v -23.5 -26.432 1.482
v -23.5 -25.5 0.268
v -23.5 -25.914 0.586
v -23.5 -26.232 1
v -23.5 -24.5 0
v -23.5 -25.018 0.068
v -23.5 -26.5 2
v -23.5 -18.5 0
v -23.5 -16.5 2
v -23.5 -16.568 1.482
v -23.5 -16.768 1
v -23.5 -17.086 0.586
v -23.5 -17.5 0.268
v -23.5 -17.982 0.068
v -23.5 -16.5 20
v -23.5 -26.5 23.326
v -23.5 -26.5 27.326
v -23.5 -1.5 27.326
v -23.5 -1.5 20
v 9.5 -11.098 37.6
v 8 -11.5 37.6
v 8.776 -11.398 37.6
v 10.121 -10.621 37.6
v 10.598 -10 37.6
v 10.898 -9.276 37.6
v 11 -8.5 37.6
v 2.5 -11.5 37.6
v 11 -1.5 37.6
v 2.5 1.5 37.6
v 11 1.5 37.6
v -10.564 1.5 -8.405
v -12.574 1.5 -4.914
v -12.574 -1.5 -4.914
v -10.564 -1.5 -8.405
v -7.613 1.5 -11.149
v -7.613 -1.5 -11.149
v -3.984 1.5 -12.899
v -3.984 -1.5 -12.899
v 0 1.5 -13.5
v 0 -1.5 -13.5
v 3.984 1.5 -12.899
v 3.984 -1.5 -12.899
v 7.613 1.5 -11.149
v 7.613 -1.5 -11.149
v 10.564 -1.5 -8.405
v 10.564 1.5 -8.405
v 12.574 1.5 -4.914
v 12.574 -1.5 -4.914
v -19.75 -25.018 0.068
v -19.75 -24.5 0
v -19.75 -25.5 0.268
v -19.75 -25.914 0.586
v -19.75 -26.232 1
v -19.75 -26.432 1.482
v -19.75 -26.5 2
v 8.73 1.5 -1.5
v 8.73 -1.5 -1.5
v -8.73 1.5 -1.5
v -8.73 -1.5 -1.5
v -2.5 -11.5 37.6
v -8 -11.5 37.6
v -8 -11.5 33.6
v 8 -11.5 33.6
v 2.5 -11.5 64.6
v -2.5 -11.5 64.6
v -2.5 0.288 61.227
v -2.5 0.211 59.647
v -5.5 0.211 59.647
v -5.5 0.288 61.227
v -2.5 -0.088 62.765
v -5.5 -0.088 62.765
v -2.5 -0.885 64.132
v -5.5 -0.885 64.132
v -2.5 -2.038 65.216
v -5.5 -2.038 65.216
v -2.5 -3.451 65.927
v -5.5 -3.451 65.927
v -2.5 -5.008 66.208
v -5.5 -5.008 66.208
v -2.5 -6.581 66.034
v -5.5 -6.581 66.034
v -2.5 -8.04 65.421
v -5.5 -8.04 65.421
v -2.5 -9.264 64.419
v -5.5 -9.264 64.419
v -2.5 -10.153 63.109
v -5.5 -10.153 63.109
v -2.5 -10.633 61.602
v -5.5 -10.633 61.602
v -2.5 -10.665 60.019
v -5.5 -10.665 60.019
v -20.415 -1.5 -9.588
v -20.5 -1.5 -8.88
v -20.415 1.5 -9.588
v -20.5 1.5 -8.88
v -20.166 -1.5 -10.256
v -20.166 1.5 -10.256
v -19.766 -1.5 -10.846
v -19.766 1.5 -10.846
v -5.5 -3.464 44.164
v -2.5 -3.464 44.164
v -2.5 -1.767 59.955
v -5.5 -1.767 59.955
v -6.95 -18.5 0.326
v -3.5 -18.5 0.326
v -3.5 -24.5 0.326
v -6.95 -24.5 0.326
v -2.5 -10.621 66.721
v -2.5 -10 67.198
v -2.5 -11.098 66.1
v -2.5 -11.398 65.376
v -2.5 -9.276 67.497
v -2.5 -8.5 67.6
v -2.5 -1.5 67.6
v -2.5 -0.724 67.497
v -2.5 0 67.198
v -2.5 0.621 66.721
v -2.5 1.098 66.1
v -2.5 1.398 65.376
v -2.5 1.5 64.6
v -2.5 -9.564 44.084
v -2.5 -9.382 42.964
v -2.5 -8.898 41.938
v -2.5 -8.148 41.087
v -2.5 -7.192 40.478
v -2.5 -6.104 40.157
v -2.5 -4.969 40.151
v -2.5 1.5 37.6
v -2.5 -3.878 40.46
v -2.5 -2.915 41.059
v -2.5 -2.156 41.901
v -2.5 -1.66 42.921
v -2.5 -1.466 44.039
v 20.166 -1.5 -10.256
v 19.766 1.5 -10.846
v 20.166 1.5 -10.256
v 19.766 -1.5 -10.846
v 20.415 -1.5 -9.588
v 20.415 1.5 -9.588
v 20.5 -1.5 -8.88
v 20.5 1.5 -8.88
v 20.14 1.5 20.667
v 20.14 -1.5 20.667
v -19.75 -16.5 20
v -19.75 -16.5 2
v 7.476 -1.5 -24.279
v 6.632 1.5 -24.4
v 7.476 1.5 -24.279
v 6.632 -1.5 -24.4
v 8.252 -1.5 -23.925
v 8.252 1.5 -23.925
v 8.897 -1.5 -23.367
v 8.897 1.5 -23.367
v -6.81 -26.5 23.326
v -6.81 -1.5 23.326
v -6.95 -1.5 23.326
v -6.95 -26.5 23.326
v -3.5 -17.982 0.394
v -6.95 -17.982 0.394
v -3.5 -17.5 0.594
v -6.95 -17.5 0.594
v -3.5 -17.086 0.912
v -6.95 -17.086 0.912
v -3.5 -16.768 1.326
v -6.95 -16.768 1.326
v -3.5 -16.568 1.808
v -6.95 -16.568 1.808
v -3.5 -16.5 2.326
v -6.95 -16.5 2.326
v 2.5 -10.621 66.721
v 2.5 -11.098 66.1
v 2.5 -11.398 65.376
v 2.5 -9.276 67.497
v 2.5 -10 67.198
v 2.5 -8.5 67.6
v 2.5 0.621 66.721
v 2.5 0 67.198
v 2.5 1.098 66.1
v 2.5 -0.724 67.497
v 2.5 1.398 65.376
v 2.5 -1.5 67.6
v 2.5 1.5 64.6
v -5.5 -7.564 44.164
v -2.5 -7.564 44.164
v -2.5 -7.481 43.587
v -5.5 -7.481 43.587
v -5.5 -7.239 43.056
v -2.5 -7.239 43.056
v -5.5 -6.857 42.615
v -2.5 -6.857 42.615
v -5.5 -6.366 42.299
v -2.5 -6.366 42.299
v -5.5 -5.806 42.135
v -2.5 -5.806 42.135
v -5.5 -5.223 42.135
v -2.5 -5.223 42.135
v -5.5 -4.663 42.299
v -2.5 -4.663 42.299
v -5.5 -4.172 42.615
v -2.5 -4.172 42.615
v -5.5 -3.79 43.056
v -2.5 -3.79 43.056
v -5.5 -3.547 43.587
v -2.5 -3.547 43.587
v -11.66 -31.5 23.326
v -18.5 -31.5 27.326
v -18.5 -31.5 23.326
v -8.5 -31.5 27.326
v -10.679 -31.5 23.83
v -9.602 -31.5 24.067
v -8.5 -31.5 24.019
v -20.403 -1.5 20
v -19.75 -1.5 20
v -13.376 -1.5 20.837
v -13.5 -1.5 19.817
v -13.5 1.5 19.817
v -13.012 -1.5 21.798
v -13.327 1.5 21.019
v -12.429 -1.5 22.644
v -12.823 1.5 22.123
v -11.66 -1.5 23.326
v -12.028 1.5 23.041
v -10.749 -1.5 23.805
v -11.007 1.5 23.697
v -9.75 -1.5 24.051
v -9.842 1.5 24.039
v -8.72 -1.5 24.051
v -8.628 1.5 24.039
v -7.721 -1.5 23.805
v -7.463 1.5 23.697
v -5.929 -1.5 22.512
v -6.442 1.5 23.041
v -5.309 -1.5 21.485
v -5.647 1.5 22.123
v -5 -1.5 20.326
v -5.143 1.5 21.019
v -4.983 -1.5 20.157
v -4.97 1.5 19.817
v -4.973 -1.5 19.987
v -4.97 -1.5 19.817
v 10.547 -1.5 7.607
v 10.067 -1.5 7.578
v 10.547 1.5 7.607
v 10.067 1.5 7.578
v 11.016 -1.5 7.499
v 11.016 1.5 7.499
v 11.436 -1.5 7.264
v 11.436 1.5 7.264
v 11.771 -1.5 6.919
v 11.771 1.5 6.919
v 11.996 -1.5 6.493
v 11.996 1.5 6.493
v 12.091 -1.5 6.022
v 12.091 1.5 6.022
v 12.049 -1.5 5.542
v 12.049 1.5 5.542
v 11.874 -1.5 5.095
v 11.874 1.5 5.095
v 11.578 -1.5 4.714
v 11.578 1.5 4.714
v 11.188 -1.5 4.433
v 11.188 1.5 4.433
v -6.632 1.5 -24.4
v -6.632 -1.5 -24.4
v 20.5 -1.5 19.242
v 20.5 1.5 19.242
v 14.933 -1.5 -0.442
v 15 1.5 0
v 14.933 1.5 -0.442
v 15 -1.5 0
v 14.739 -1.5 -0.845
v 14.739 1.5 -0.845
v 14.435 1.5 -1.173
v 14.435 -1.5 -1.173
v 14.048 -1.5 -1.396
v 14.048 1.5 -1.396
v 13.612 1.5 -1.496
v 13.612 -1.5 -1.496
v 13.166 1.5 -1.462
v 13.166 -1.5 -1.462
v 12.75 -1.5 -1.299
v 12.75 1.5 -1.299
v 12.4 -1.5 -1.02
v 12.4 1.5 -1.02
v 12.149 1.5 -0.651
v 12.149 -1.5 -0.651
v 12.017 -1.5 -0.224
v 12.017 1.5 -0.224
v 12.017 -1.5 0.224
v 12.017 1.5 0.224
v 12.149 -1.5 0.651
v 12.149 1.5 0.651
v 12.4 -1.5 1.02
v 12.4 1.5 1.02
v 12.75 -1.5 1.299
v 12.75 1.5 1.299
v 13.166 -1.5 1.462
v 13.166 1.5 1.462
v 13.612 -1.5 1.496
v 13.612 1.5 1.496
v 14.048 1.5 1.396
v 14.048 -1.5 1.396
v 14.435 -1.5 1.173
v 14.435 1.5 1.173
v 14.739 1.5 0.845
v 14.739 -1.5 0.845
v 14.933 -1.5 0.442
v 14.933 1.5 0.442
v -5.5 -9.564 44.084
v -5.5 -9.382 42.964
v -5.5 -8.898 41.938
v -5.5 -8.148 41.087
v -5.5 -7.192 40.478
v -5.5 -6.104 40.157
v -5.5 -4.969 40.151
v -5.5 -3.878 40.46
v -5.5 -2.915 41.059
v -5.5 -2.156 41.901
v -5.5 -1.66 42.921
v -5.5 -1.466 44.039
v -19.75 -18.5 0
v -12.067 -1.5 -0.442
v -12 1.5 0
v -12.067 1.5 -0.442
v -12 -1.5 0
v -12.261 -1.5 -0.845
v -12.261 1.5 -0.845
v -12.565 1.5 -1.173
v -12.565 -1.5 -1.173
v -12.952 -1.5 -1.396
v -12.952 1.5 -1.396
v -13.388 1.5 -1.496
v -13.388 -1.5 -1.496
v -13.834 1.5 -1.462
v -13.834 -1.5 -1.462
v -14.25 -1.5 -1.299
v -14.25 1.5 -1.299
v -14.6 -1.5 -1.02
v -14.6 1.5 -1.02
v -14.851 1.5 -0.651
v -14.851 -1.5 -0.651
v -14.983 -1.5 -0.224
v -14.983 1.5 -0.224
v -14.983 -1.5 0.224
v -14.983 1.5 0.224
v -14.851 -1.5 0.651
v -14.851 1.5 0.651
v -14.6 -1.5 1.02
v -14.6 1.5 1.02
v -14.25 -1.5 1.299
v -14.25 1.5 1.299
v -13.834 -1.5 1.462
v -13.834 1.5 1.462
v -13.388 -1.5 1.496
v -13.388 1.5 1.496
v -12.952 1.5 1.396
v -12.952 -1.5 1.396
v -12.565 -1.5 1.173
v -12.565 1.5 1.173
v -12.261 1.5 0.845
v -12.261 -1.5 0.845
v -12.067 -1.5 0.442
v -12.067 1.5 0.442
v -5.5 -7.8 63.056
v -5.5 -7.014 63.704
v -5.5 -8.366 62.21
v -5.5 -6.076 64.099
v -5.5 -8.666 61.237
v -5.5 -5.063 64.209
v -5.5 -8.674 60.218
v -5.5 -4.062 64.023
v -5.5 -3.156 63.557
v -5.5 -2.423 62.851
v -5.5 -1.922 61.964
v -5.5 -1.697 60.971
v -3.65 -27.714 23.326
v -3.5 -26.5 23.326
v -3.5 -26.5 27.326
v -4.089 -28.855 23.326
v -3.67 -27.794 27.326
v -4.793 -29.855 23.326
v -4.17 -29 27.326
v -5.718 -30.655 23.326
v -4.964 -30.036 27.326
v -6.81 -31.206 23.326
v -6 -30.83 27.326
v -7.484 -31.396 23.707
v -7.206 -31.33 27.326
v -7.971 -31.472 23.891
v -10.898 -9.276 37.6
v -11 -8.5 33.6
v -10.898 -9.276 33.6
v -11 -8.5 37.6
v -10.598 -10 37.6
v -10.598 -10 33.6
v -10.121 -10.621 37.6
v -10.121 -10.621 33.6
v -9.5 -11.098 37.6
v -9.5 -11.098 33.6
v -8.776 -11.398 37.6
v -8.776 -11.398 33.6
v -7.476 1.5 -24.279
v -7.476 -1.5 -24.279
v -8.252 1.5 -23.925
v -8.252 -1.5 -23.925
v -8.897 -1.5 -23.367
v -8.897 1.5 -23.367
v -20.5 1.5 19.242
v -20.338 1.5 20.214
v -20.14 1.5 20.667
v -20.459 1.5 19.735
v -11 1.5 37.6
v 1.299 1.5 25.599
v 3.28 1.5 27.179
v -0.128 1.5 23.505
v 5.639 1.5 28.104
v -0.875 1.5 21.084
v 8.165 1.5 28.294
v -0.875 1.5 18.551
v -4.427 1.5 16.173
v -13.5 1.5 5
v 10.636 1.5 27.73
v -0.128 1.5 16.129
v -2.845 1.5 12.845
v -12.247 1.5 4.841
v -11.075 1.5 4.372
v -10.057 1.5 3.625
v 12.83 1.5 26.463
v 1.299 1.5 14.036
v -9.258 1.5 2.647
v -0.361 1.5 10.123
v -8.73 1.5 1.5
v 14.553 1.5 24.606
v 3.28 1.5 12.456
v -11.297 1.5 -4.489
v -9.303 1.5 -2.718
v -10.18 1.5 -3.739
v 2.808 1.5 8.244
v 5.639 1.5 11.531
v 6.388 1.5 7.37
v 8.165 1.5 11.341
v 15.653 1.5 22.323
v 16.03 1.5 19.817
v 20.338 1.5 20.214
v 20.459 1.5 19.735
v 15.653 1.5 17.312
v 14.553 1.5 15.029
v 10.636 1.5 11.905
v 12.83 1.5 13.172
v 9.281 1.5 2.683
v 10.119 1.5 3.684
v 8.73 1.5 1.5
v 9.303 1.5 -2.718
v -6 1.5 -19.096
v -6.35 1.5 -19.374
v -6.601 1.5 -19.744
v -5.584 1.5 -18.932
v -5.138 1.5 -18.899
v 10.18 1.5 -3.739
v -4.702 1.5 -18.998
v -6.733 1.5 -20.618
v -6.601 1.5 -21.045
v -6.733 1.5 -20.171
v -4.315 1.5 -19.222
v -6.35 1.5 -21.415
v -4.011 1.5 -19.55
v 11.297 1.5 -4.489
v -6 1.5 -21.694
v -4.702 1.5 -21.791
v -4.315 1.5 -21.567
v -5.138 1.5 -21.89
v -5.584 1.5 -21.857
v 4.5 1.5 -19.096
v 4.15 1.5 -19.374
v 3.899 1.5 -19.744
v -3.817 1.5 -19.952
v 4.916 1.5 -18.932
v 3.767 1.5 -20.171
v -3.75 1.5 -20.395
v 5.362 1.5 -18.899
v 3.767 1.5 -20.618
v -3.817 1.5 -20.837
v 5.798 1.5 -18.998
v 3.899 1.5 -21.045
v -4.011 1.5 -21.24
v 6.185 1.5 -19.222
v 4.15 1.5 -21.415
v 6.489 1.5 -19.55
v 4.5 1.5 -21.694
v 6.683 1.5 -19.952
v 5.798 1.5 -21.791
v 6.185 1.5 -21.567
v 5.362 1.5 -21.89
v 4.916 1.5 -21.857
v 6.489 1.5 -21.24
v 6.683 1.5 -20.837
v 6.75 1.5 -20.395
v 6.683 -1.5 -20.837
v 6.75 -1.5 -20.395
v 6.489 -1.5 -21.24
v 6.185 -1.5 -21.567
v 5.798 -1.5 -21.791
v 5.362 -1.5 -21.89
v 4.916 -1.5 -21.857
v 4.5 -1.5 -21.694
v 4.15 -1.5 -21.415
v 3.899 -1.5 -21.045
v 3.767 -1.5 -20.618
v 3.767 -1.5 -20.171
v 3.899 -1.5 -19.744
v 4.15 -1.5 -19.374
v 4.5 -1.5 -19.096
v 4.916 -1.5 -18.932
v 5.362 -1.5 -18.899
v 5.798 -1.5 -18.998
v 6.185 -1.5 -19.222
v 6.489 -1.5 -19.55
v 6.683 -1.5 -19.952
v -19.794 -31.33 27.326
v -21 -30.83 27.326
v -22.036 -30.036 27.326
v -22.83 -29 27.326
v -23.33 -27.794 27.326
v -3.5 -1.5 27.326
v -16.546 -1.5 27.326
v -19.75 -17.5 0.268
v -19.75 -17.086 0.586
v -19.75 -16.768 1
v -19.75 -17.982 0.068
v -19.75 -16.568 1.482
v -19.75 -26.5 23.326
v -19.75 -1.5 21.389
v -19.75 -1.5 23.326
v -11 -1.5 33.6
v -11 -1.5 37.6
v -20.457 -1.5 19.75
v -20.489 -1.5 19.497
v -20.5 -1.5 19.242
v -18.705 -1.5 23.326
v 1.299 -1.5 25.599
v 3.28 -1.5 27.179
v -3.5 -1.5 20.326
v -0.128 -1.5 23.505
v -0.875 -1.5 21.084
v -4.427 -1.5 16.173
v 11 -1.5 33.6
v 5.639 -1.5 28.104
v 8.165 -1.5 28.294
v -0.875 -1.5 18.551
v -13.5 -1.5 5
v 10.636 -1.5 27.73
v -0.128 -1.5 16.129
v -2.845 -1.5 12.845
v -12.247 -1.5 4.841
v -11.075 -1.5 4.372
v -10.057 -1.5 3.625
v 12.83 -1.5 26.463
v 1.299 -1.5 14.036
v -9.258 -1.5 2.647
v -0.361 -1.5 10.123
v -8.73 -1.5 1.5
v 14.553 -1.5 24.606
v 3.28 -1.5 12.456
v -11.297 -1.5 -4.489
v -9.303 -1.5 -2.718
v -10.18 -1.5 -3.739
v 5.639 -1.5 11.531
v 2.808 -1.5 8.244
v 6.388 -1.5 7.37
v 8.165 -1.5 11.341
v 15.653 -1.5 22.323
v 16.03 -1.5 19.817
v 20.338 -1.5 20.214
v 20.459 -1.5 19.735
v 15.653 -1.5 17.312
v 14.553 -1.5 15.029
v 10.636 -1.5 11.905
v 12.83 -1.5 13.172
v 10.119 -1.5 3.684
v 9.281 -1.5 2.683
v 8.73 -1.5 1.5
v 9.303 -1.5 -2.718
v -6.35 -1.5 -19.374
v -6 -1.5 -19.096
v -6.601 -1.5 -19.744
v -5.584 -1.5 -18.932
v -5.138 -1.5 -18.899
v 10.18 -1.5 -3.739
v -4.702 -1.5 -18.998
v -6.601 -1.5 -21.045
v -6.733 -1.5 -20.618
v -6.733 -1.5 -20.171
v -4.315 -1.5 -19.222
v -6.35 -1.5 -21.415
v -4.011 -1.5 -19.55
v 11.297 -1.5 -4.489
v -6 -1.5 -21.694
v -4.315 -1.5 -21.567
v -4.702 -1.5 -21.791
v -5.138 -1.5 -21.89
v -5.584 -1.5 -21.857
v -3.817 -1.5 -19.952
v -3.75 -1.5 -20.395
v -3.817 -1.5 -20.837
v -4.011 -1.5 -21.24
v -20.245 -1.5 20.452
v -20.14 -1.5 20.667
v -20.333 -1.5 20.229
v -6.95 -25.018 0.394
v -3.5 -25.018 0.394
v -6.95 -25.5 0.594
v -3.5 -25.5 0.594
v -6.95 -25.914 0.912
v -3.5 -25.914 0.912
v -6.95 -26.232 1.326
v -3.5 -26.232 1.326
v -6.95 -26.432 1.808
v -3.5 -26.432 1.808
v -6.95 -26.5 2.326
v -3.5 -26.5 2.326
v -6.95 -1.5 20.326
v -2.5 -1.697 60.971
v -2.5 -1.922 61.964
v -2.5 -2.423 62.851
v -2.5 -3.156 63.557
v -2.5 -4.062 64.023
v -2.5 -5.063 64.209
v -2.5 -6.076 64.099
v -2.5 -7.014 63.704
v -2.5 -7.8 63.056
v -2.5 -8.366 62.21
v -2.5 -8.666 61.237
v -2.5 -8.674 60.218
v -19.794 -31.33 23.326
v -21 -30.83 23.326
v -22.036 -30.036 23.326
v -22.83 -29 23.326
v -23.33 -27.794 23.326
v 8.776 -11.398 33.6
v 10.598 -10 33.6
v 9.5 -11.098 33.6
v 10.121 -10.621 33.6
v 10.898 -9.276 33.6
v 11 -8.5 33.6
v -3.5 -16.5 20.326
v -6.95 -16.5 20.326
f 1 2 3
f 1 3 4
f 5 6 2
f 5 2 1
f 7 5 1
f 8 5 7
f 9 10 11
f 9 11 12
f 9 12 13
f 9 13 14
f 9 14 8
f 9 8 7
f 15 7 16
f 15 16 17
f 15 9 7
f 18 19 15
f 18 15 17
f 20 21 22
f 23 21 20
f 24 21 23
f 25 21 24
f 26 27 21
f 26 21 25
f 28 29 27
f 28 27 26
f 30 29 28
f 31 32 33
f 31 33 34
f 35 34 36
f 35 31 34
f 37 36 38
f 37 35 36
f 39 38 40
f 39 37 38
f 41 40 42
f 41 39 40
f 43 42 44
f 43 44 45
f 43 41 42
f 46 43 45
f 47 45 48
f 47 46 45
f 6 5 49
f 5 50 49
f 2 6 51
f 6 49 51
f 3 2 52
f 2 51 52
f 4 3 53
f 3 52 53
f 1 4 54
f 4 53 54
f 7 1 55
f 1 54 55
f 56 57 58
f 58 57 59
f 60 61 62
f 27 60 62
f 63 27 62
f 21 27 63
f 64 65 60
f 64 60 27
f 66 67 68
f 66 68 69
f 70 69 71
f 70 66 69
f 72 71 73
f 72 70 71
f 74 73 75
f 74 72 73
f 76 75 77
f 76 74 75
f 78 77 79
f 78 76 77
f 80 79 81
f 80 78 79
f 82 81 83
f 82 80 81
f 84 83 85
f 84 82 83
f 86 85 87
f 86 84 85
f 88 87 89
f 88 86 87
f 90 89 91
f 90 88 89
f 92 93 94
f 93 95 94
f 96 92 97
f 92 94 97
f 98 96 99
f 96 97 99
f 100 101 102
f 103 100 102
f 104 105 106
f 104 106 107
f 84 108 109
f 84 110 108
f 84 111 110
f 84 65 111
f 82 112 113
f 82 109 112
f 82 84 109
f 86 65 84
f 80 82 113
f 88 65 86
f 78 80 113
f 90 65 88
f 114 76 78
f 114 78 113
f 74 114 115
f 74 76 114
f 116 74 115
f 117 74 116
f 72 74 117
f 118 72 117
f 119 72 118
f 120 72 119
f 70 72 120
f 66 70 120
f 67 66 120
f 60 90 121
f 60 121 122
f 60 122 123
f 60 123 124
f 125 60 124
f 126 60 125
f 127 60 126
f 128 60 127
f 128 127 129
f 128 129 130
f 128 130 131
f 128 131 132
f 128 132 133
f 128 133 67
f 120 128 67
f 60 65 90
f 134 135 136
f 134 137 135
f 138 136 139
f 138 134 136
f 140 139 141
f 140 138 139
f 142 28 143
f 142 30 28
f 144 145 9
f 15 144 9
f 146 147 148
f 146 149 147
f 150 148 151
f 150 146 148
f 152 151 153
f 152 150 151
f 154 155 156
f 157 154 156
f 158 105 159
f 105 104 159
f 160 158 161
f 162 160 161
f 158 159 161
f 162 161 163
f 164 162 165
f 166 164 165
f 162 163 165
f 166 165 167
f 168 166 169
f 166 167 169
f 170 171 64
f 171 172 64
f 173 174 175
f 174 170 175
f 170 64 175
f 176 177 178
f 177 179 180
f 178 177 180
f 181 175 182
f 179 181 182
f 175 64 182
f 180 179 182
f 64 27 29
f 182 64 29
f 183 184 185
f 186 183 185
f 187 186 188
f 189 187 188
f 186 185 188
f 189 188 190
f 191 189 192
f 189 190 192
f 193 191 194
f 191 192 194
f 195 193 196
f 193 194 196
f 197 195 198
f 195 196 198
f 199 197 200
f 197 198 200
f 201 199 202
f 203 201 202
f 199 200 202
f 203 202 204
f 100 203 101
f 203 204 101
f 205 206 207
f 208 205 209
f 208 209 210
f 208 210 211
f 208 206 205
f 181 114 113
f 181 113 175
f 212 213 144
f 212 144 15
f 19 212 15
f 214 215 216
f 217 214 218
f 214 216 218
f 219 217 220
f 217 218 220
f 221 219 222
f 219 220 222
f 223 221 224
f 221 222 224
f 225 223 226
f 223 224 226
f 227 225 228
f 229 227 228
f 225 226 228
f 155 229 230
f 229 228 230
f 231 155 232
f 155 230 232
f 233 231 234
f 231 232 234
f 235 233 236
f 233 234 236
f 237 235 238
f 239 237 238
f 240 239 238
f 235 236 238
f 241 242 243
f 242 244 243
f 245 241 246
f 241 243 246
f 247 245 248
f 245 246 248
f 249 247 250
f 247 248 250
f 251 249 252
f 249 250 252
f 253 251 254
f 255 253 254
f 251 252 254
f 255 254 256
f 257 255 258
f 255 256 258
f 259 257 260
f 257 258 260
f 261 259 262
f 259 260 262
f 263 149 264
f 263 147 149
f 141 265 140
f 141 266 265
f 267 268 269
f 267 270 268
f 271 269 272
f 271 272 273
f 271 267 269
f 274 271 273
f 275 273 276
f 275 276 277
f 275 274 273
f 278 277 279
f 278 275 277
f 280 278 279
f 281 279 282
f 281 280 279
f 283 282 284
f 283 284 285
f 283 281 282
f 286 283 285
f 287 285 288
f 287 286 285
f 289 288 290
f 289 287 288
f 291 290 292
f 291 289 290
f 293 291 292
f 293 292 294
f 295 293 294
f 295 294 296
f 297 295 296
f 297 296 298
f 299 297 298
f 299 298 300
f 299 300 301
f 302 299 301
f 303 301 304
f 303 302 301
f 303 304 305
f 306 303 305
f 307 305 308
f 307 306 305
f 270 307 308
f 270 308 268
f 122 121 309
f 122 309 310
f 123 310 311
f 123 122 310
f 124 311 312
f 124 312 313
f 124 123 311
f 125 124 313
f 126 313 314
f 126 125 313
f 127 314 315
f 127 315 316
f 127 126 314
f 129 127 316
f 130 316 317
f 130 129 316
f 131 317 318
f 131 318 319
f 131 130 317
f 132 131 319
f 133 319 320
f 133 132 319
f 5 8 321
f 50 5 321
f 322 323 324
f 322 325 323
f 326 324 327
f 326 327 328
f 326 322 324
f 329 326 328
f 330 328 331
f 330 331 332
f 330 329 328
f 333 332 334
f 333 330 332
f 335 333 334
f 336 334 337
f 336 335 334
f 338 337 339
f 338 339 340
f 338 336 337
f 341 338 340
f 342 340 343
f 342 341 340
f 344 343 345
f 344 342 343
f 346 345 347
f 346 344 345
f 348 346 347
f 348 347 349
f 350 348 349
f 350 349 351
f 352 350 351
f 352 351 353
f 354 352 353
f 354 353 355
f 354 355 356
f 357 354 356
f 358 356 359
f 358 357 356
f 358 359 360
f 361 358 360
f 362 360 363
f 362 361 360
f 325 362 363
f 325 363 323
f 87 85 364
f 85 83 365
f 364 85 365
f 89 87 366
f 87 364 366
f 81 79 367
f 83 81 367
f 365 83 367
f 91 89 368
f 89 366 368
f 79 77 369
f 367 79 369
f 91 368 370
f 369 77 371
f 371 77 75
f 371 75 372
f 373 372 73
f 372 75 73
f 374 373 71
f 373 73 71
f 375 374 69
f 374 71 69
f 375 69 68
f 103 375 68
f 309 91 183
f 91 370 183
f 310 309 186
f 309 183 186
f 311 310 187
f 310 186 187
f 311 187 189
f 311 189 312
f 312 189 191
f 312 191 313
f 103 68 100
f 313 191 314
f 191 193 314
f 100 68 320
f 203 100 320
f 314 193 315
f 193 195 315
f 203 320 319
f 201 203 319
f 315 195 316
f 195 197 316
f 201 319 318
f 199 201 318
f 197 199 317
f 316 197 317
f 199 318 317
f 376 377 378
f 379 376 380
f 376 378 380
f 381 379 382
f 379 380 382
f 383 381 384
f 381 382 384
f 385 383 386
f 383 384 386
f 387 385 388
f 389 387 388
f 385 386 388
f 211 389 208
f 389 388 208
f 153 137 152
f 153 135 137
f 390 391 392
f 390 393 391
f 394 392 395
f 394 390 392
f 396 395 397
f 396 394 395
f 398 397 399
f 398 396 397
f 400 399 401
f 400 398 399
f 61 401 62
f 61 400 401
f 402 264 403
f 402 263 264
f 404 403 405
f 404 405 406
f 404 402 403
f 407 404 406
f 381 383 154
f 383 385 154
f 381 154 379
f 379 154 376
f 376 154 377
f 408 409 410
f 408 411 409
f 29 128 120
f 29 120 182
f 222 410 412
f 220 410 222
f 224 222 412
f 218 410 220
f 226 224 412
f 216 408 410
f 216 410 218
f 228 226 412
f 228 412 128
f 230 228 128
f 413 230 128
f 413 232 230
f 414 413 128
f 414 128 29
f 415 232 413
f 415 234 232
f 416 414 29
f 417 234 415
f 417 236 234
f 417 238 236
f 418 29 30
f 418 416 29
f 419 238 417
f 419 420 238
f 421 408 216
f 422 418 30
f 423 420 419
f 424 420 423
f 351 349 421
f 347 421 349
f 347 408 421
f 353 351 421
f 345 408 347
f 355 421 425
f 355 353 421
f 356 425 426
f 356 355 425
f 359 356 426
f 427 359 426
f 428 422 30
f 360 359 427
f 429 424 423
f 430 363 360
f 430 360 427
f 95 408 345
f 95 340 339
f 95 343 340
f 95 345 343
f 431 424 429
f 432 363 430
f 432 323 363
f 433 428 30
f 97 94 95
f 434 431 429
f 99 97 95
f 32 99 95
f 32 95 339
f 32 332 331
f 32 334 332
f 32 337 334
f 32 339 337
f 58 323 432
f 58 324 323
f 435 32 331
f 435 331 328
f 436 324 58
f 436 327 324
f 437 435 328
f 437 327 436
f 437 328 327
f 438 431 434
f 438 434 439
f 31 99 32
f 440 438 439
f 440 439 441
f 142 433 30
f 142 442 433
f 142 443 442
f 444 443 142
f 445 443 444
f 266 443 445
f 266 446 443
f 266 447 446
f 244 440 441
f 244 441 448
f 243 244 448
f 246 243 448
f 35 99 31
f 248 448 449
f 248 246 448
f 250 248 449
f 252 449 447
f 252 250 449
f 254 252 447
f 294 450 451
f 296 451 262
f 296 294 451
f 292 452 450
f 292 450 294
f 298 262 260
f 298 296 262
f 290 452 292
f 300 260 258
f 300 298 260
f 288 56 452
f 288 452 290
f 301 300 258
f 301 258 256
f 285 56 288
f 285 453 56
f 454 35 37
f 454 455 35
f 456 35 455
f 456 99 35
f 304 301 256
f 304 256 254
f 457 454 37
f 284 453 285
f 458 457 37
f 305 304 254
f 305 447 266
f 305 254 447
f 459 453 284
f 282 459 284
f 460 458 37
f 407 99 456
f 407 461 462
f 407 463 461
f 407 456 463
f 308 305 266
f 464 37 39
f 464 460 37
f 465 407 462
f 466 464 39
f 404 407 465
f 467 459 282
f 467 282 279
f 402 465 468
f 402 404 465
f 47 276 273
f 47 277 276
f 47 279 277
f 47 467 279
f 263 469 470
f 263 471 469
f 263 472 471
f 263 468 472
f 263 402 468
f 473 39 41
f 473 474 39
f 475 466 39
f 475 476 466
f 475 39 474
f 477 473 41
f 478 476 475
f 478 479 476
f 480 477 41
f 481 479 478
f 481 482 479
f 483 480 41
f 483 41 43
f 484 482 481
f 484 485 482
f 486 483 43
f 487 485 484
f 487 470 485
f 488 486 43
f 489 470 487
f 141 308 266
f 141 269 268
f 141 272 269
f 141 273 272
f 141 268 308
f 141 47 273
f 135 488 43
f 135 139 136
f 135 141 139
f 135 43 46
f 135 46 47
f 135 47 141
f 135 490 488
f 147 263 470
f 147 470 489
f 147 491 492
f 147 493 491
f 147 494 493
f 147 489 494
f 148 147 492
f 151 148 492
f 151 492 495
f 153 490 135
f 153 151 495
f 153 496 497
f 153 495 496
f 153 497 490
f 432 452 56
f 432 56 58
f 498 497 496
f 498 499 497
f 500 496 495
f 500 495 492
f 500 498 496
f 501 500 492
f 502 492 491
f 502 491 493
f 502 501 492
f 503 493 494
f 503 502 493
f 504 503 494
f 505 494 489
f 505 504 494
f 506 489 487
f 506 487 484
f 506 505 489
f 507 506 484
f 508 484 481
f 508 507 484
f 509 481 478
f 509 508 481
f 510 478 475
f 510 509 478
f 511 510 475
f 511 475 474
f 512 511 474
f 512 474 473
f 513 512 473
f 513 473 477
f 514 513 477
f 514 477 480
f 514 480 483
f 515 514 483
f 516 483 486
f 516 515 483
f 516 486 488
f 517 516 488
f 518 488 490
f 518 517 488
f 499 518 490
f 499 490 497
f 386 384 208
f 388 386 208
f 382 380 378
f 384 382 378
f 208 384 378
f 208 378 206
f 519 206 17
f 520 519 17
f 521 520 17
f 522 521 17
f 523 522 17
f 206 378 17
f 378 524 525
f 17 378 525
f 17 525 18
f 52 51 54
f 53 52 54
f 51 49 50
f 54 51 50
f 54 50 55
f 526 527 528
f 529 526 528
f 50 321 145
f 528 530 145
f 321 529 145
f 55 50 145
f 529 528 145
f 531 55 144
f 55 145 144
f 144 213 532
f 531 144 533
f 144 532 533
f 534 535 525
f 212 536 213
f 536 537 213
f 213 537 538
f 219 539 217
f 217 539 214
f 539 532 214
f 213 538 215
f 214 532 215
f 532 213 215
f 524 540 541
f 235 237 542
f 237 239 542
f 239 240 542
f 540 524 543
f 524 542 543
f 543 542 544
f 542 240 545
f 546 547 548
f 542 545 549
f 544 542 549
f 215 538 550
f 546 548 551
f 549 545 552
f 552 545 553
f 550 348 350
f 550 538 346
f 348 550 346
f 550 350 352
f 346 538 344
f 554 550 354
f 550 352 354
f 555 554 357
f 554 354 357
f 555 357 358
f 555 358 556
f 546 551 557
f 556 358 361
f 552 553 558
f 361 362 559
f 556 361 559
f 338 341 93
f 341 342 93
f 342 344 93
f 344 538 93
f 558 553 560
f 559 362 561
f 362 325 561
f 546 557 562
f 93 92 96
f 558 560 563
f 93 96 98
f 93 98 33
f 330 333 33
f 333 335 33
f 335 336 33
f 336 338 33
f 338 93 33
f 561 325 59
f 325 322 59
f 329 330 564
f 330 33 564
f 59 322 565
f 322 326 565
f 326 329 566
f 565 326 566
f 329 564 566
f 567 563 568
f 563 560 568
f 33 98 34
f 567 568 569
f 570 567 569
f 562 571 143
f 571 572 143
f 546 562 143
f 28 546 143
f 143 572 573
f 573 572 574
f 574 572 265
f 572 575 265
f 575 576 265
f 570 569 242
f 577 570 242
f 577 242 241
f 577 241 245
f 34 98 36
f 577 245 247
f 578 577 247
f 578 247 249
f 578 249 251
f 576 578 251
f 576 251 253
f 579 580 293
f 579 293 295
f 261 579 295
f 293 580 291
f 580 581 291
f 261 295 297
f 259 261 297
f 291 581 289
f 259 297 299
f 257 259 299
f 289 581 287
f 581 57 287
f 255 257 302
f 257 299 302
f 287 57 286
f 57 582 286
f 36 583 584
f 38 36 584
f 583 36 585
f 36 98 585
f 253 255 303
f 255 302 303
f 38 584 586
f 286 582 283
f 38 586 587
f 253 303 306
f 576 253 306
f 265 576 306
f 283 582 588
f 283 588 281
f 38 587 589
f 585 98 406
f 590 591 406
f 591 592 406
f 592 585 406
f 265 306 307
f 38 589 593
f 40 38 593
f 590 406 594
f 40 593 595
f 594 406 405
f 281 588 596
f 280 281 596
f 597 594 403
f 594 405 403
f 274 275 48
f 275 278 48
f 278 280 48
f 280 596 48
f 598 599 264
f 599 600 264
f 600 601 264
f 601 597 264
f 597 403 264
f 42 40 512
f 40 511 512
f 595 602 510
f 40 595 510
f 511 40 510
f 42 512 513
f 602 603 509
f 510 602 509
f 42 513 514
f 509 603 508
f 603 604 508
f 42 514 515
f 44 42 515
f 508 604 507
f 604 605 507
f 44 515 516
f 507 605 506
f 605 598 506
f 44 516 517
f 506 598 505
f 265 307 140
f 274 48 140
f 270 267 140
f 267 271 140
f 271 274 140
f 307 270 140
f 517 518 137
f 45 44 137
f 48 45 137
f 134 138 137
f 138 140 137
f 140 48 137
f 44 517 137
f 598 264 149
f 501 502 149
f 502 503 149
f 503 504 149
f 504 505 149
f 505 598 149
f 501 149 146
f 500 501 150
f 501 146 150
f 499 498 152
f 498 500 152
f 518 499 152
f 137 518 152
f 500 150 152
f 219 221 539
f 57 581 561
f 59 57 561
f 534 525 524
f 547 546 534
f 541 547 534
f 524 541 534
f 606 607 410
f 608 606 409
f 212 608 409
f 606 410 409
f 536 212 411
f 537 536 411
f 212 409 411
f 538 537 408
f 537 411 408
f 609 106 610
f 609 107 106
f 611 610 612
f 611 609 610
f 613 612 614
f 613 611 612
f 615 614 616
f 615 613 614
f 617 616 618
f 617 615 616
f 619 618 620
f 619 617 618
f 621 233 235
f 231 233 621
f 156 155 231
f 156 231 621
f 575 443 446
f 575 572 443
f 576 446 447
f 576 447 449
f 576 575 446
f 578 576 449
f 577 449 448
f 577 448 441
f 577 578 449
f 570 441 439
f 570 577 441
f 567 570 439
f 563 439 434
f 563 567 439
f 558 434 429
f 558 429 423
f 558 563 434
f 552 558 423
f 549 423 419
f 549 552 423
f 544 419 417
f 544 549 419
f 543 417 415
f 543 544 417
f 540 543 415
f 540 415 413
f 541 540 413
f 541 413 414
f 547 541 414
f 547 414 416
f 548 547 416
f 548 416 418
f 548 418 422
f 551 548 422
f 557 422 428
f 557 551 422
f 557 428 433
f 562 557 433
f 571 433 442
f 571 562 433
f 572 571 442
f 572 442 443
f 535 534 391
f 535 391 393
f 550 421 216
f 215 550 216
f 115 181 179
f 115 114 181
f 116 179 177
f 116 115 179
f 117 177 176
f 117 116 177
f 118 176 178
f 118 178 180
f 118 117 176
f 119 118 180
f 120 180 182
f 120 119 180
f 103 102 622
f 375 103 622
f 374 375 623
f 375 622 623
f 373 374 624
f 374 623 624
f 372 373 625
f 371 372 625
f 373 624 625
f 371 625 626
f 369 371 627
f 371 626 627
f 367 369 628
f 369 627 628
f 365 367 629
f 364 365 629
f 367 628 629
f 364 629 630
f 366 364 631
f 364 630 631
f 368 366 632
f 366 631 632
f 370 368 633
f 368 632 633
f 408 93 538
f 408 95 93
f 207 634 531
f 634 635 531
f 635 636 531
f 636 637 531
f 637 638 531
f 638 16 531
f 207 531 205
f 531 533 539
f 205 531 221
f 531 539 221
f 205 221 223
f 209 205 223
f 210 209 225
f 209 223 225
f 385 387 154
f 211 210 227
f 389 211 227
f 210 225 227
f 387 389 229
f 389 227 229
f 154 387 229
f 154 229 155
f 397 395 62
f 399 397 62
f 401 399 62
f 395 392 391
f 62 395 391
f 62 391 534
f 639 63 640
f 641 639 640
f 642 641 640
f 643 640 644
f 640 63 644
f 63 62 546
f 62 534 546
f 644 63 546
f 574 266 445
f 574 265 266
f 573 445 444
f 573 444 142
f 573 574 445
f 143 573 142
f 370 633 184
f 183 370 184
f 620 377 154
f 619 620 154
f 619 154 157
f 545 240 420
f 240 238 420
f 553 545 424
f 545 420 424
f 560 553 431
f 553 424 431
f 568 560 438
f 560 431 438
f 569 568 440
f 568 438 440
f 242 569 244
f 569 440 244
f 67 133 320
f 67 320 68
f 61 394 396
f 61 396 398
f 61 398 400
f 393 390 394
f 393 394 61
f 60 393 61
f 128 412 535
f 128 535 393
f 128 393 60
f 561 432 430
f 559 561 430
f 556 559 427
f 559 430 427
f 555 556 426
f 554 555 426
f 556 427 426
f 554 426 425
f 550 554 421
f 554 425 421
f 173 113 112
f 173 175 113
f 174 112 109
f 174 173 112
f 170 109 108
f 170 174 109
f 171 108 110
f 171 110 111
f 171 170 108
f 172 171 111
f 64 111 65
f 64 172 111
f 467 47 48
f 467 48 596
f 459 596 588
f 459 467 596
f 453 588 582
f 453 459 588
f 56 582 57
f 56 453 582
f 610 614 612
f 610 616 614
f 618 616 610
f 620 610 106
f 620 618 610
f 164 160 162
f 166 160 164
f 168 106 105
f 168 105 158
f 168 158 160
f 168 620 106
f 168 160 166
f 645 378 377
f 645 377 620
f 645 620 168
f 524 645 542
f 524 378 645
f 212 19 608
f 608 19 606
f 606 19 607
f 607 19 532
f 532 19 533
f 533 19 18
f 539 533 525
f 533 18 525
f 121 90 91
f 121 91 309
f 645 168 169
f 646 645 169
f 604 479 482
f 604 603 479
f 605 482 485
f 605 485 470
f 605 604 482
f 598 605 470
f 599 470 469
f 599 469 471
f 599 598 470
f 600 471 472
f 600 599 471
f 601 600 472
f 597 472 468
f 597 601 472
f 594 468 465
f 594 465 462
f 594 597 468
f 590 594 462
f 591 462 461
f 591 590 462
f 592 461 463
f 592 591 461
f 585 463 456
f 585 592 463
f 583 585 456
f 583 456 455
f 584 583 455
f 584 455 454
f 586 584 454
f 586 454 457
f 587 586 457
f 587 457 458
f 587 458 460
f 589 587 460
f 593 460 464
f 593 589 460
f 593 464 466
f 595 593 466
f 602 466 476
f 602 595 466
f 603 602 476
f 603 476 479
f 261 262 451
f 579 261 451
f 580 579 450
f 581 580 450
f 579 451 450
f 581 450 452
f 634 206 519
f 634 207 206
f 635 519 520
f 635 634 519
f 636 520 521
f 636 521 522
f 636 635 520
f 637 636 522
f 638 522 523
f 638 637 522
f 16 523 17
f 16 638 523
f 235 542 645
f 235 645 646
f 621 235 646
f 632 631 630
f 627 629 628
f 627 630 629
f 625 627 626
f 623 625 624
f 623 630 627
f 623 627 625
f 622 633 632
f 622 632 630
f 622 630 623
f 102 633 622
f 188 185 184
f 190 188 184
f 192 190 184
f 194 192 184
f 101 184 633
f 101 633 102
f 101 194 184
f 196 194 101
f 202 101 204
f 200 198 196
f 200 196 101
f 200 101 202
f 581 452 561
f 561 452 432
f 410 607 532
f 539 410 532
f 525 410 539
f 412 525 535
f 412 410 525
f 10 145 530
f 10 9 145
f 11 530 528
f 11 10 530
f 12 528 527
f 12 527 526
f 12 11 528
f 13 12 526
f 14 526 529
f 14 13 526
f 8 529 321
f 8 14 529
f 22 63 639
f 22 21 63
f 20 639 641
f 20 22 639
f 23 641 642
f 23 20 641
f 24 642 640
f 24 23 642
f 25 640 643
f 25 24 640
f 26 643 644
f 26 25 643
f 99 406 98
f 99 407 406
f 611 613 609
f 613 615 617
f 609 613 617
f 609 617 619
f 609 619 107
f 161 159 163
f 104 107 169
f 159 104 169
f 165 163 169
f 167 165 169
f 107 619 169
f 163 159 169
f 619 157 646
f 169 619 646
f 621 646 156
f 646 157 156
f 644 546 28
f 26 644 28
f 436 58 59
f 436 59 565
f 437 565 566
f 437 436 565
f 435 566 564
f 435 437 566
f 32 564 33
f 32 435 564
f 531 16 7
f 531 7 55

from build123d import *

# Parameters (mm, degrees)
SKETCH1_R            = 1.5
SKETCH1_R_2          = 8.5
BOSS_EXTRUDE1_DEPTH  = 1.5
FILLET1_R            = 3
BOSS_EXTRUDE2_DEPTH  = 30
SKETCH7_W            = 3.75
SKETCH7_H            = 23.325864092
BOSS_EXTRUDE4_DEPTH  = 25
SKETCH10_W           = 3.45
SKETCH10_H           = 25
BOSS_EXTRUDE15_DEPTH = 23
SKETCH11_W           = 3.75
SKETCH11_H           = 15
CUT_EXTRUDE1_DEPTH   = 20
SKETCH12_W           = 3.45
SKETCH12_H           = 15
CUT_EXTRUDE2_DEPTH   = 20
SKETCH13_W           = 22
SKETCH13_H           = 4
BOSS_EXTRUDE16_DEPTH = 10
SKETCH14_W           = 2.5
SKETCH14_H           = 13
BOSS_EXTRUDE17_DEPTH = 30
FILLET3_R            = 3
FILLET4_R            = 3
FILLET5_R            = 3
FILLET6_R            = 3
FILLET7_R            = 2
FILLET8_R            = 2
FILLET9_R            = 2
FILLET10_R           = 2
FILLET11_R           = 5
FILLET12_R           = 5
BOSS_EXTRUDE18_DEPTH = 3


with BuildPart() as part:
    # Sketch1 → Boss-Extrude1 (new body, symmetric)
    with BuildSketch(Plane(origin=(0, 0, 0), x_dir=(1, 0, 0), z_dir=(0, 1, 0))):
        Polygon((8, 24.400284093), (-8, 24.400284093), (-20.5, 10), (-20.5, -20), (-11, -37.599715907), (11, -37.599715907), (20.5, -20), (20.5, 10), align=None)
        with Locations((-5.25, 20.39454584)):
            Circle(SKETCH1_R, mode=Mode.SUBTRACT)
        with Locations((5.25, 20.39454584)):
            Circle(SKETCH1_R, mode=Mode.SUBTRACT)
        with Locations((-13.5, 0)):
            Circle(SKETCH1_R, mode=Mode.SUBTRACT)
        with Locations((13.5, 0)):
            Circle(SKETCH1_R, mode=Mode.SUBTRACT)
        with Locations((7.530163354, -19.817414772)):
            Circle(SKETCH1_R_2, mode=Mode.SUBTRACT)
        with BuildLine():
            Line((-13.5, -5), (-13.5, -19.817414772))
            ThreePointArc((-13.5, -19.817414772), (-9.234918323, -24.082496449), (-4.969836646, -19.817414772))
            ThreePointArc((-4.969836646, -19.817414772), (-0.361028795, -10.12313365), (10.06681719, -7.57750516))
            ThreePointArc((10.06681719, -7.57750516), (11.99598649, -6.493442694), (11.187975781, -4.433344563))
            ThreePointArc((11.187975781, -4.433344563), (9.667400631, -3.211102938), (8.730303993, -1.5))
            Line((8.730303993, -1.5), (-8.730303993, -1.5))
            ThreePointArc((-8.730303993, -1.5), (-10.541960108, -4.031128874), (-13.5, -5))
        make_face(mode=Mode.SUBTRACT)
        with BuildLine():
            Line((8.730303993, 1.5), (-8.730303993, 1.5))
            ThreePointArc((-8.730303993, 1.5), (-10.179901517, 3.738575405), (-12.574074074, 4.913518208))
            ThreePointArc((-12.574074074, 4.913518208), (0, 13.5), (12.574074074, 4.913518208))
            ThreePointArc((12.574074074, 4.913518208), (10.179901517, 3.738575405), (8.730303993, 1.5))
        make_face(mode=Mode.SUBTRACT)
    extrude(amount=BOSS_EXTRUDE1_DEPTH, both=True)

    # Fillet1
    fillet1_edges = [part.edges().sort_by_distance(p)[0] for p in [
        (-20.5, 0, 20),
        (-20.5, 0, -10),
        (-8, 0, -24.400284093),
        (8, 0, -24.400284093),
        (20.5, 0, -10),
        (20.5, 0, 20),
    ]]
    fillet(fillet1_edges, radius=FILLET1_R)

    # Sketch4 → Boss-Extrude2 (add)
    with BuildSketch(Plane.XZ.offset(1.5)):
        Polygon((-23.5, 27.325864092), (-23.5, 23.325864092), (-18.70476029, 23.325864092), (-16.545634529, 27.325864092), align=None)
        with BuildLine():
            Line((-18.70476029, 23.325864092), (-13.5, 23.325864092))
            Line((-13.5, 23.325864092), (-11.660141009, 23.325864092))
            ThreePointArc((-11.660141009, 23.325864092), (-9.234918323, 24.082496449), (-6.809695637, 23.325864092))
            Line((-6.809695637, 23.325864092), (-3.5, 23.325864092))
            Line((-3.5, 23.325864092), (-3.5, 27.325864092))
            Line((-3.5, 27.325864092), (-16.545634529, 27.325864092))
            Line((-16.545634529, 27.325864092), (-18.70476029, 23.325864092))
        make_face()
    extrude(amount=BOSS_EXTRUDE2_DEPTH)

    # Sketch7 → Boss-Extrude4 (add)
    with BuildSketch(Plane.XZ.offset(1.5)):
        with Locations((-21.625, 11.662932046)):
            Rectangle(SKETCH7_W, SKETCH7_H)
    extrude(amount=BOSS_EXTRUDE4_DEPTH)

    # Sketch10 → Boss-Extrude15 (add)
    with BuildSketch(Plane(origin=(0, 0, 23.325864092), x_dir=(-1, 0, 0), z_dir=(0, 0, -1))):
        with Locations((5.225, -14)):
            Rectangle(SKETCH10_W, SKETCH10_H)
    extrude(amount=BOSS_EXTRUDE15_DEPTH)

    # Sketch11 → Cut-Extrude1 (cut)
    with BuildSketch(Plane(origin=(0, 0, 0), x_dir=(-1, 0, 0), z_dir=(0, 0, -1))):
        with Locations((21.625, -9)):
            Rectangle(SKETCH11_W, SKETCH11_H)
    extrude(amount=-CUT_EXTRUDE1_DEPTH, mode=Mode.SUBTRACT)

    # Sketch12 → Cut-Extrude2 (cut)
    with BuildSketch(Plane(origin=(0, 0, 0.325864092), x_dir=(-1, 0, 0), z_dir=(0, 0, -1))):
        with Locations((5.225, -9)):
            Rectangle(SKETCH12_W, SKETCH12_H)
    extrude(amount=-CUT_EXTRUDE2_DEPTH, mode=Mode.SUBTRACT)

    # Sketch13 → Boss-Extrude16 (add)
    with BuildSketch(Plane.XZ.offset(1.5)):
        with Locations((0, 35.599715907)):
            Rectangle(SKETCH13_W, SKETCH13_H)
    extrude(amount=BOSS_EXTRUDE16_DEPTH)

    # Sketch14 → Boss-Extrude17 (add)
    with BuildSketch(Plane.XY.offset(37.599715907)):
        with Locations((1.25, -5)):
            Rectangle(SKETCH14_W, SKETCH14_H)
        with Locations((-1.25, -5)):
            Rectangle(SKETCH14_W, SKETCH14_H)
    extrude(amount=BOSS_EXTRUDE17_DEPTH)

    # Fillet3
    fillet3_edges = [part.edges().sort_by_distance(p)[0] for p in [
        (-11, -11.5, 35.599715907),
    ]]
    fillet(fillet3_edges, radius=FILLET3_R)

    # Fillet4
    fillet4_edges = [part.edges().sort_by_distance(p)[0] for p in [
        (11, -11.5, 35.599715907),
    ]]
    fillet(fillet4_edges, radius=FILLET4_R)

    # Fillet5
    fillet5_edges = [part.edges().sort_by_distance(p)[0] for p in [
        (0, 1.5, 67.599715907),
    ]]
    fillet(fillet5_edges, radius=FILLET5_R)

    # Fillet6
    fillet6_edges = [part.edges().sort_by_distance(p)[0] for p in [
        (0, -11.5, 67.599715907),
    ]]
    fillet(fillet6_edges, radius=FILLET6_R)

    # Fillet7
    fillet7_edges = [part.edges().sort_by_distance(p)[0] for p in [
        (-21.625, -16.5, 0),
    ]]
    fillet(fillet7_edges, radius=FILLET7_R)

    # Fillet8
    fillet8_edges = [part.edges().sort_by_distance(p)[0] for p in [
        (-21.625, -26.5, 0),
    ]]
    fillet(fillet8_edges, radius=FILLET8_R)

    # Fillet9
    fillet9_edges = [part.edges().sort_by_distance(p)[0] for p in [
        (-5.225, -26.5, 0.325864092),
    ]]
    fillet(fillet9_edges, radius=FILLET9_R)

    # Fillet10
    fillet10_edges = [part.edges().sort_by_distance(p)[0] for p in [
        (-5.225, -16.5, 0.325864092),
    ]]
    fillet(fillet10_edges, radius=FILLET10_R)

    # Fillet11
    fillet11_edges = [part.edges().sort_by_distance(p)[0] for p in [
        (-3.5, -31.5, 25.325864092),
    ]]
    fillet(fillet11_edges, radius=FILLET11_R)

    # Fillet12
    fillet12_edges = [part.edges().sort_by_distance(p)[0] for p in [
        (-23.5, -31.5, 25.325864092),
    ]]
    fillet(fillet12_edges, radius=FILLET12_R)

    # Sketch15 → Boss-Extrude18 (add)
    with BuildSketch(Plane.ZY.offset(2.5)):
        with BuildLine():
            Line((60.019494917, -10.664595798), (44.083601773, -9.563551575))
            ThreePointArc((44.083601773, -9.563551575), (40.114289707, -5.53663584), (44.039052889, -1.466289101))
            Line((44.039052889, -1.466289101), (59.646971548, 0.211283454))
            ThreePointArc((59.646971548, 0.211283454), (66.207952811, -5.008307663), (60.019494917, -10.664595798))
        make_face()
        with BuildLine():
            Line((60.218460063, -8.673574683), (44.164228414, -7.564354205))
            ThreePointArc((44.164228414, -7.564354205), (42.114228414, -5.514354205), (44.164228414, -3.464354205))
            Line((44.164228414, -3.464354205), (59.955274566, -1.767098714))
            ThreePointArc((59.955274566, -1.767098714), (64.208636435, -5.063268193), (60.218460063, -8.673574683))
        make_face(mode=Mode.SUBTRACT)
    extrude(amount=BOSS_EXTRUDE18_DEPTH)


solid = part.part
